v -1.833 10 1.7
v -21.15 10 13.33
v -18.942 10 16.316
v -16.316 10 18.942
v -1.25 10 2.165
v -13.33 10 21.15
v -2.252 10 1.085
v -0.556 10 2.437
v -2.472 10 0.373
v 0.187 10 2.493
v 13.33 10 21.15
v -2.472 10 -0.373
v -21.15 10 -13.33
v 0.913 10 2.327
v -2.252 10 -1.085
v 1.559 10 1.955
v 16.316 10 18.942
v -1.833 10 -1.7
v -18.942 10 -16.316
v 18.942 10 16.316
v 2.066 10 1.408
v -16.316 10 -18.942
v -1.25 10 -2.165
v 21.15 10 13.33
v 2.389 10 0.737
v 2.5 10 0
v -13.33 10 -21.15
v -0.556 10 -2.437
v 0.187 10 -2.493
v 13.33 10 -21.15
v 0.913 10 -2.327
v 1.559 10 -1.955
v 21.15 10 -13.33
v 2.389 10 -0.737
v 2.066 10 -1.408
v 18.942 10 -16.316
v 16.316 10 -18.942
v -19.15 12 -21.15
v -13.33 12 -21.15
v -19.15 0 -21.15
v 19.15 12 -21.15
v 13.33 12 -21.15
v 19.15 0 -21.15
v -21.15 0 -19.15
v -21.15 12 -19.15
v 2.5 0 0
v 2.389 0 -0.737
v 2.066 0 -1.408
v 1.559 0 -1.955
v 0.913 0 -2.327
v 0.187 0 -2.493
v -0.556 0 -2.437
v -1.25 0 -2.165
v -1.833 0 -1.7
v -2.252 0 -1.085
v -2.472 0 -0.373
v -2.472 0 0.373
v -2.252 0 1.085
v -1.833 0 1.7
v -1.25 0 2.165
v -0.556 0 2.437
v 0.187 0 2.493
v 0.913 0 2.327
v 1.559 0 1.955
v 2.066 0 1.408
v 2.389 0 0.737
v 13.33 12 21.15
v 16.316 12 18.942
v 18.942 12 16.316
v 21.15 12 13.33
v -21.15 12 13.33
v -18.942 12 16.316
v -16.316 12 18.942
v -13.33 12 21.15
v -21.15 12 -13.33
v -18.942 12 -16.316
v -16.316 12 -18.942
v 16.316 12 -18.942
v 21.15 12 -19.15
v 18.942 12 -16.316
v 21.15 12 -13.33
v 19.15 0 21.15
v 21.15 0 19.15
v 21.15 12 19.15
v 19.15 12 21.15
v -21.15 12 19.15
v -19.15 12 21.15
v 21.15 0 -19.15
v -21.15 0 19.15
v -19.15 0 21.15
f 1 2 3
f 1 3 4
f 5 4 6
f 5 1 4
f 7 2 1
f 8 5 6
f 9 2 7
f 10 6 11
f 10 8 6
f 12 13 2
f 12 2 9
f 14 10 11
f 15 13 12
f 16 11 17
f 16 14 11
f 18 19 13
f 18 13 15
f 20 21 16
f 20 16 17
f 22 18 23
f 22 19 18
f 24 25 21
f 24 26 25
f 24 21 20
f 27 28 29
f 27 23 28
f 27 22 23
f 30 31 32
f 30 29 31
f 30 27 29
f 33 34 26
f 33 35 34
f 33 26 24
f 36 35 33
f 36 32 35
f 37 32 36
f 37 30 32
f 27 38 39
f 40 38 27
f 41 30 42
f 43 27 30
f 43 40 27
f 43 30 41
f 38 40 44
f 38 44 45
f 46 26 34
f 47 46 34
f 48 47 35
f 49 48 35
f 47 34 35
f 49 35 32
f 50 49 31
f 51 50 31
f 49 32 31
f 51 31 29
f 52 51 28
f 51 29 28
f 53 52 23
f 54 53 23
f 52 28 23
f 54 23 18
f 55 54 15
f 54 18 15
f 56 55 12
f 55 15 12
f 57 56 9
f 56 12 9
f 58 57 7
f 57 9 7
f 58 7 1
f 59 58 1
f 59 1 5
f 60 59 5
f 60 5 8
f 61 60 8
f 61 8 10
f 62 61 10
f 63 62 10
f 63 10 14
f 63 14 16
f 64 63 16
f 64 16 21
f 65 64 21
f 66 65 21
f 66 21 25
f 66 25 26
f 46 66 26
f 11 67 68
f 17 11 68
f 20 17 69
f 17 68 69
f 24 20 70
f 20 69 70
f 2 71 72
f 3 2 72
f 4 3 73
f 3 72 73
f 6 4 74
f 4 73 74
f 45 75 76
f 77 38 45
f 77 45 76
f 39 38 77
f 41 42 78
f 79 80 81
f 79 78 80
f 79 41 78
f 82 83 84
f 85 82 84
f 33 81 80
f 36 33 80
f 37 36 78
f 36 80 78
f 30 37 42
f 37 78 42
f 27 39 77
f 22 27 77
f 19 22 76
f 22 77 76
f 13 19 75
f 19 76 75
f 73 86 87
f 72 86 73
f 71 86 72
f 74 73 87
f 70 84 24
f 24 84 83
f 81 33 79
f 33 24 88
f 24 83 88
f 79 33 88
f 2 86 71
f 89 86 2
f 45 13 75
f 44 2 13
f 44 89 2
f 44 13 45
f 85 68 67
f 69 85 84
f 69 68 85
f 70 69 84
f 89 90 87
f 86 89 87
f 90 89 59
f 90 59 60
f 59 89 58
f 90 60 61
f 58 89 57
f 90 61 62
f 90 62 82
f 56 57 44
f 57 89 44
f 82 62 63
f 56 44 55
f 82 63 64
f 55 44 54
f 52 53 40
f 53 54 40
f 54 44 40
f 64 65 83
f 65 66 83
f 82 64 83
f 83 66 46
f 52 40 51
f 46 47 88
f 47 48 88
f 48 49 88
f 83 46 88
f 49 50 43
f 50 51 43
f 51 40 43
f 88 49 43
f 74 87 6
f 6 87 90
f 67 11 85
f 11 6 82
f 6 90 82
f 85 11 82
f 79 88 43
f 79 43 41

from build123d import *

# Parameters (mm, degrees)
CROQUIS1_W              = 42.3
CROQUIS1_H              = 42.3
SALIENTE_EXTRUIR1_DEPTH = 12
CORTAR_EXTRUIR1_DEPTH   = 2
CHAFL_N1_SIZE           = 2
CROQUIS3_R              = 2.5
CORTAR_EXTRUIR2_DEPTH   = 11


with BuildPart() as part:
    # Croquis1 → Saliente-Extruir1 (new body)
    with BuildSketch(Plane(origin=(0, 0, 0), x_dir=(1, 0, 0), z_dir=(0, 1, 0))):
        Rectangle(CROQUIS1_W, CROQUIS1_H)
    extrude(amount=SALIENTE_EXTRUIR1_DEPTH)

    # Croquis2 → Cortar-Extruir1 (cut)
    with BuildSketch(Plane(origin=(0, 12, 0), x_dir=(1, 0, 0), z_dir=(0, 1, 0))):
        with BuildLine():
            Line((-21.15, 13.329572386), (-21.15, -13.329572386))
            ThreePointArc((-21.15, -13.329572386), (-17.67766953, -17.67766953), (-13.329572386, -21.15))
            Line((-13.329572386, -21.15), (13.329572386, -21.15))
            ThreePointArc((13.329572386, -21.15), (17.67766953, -17.67766953), (21.15, -13.329572386))
            Line((21.15, -13.329572386), (21.15, 13.329572386))
            ThreePointArc((21.15, 13.329572386), (17.67766953, 17.67766953), (13.329572386, 21.15))
            Line((13.329572386, 21.15), (-13.329572386, 21.15))
            ThreePointArc((-13.329572386, 21.15), (-17.67766953, 17.67766953), (-21.15, 13.329572386))
        make_face()
    extrude(amount=-CORTAR_EXTRUIR1_DEPTH, mode=Mode.SUBTRACT)

    # Chaflán1
    chafl_n1_edges = [part.edges().sort_by_distance(p)[0] for p in [
        (21.15, 6, 21.15),
        (-21.15, 6, 21.15),
        (-21.15, 6, -21.15),
        (21.15, 6, -21.15),
    ]]
    chamfer(chafl_n1_edges, length=CHAFL_N1_SIZE)

    # Croquis3 → Cortar-Extruir2 (cut, through all)
    with BuildSketch(Plane(origin=(0, 10, 0), x_dir=(1, 0, 0), z_dir=(0, 1, 0))):
        Circle(CROQUIS3_R)
    extrude(amount=-CORTAR_EXTRUIR2_DEPTH, mode=Mode.SUBTRACT)


solid = part.part
